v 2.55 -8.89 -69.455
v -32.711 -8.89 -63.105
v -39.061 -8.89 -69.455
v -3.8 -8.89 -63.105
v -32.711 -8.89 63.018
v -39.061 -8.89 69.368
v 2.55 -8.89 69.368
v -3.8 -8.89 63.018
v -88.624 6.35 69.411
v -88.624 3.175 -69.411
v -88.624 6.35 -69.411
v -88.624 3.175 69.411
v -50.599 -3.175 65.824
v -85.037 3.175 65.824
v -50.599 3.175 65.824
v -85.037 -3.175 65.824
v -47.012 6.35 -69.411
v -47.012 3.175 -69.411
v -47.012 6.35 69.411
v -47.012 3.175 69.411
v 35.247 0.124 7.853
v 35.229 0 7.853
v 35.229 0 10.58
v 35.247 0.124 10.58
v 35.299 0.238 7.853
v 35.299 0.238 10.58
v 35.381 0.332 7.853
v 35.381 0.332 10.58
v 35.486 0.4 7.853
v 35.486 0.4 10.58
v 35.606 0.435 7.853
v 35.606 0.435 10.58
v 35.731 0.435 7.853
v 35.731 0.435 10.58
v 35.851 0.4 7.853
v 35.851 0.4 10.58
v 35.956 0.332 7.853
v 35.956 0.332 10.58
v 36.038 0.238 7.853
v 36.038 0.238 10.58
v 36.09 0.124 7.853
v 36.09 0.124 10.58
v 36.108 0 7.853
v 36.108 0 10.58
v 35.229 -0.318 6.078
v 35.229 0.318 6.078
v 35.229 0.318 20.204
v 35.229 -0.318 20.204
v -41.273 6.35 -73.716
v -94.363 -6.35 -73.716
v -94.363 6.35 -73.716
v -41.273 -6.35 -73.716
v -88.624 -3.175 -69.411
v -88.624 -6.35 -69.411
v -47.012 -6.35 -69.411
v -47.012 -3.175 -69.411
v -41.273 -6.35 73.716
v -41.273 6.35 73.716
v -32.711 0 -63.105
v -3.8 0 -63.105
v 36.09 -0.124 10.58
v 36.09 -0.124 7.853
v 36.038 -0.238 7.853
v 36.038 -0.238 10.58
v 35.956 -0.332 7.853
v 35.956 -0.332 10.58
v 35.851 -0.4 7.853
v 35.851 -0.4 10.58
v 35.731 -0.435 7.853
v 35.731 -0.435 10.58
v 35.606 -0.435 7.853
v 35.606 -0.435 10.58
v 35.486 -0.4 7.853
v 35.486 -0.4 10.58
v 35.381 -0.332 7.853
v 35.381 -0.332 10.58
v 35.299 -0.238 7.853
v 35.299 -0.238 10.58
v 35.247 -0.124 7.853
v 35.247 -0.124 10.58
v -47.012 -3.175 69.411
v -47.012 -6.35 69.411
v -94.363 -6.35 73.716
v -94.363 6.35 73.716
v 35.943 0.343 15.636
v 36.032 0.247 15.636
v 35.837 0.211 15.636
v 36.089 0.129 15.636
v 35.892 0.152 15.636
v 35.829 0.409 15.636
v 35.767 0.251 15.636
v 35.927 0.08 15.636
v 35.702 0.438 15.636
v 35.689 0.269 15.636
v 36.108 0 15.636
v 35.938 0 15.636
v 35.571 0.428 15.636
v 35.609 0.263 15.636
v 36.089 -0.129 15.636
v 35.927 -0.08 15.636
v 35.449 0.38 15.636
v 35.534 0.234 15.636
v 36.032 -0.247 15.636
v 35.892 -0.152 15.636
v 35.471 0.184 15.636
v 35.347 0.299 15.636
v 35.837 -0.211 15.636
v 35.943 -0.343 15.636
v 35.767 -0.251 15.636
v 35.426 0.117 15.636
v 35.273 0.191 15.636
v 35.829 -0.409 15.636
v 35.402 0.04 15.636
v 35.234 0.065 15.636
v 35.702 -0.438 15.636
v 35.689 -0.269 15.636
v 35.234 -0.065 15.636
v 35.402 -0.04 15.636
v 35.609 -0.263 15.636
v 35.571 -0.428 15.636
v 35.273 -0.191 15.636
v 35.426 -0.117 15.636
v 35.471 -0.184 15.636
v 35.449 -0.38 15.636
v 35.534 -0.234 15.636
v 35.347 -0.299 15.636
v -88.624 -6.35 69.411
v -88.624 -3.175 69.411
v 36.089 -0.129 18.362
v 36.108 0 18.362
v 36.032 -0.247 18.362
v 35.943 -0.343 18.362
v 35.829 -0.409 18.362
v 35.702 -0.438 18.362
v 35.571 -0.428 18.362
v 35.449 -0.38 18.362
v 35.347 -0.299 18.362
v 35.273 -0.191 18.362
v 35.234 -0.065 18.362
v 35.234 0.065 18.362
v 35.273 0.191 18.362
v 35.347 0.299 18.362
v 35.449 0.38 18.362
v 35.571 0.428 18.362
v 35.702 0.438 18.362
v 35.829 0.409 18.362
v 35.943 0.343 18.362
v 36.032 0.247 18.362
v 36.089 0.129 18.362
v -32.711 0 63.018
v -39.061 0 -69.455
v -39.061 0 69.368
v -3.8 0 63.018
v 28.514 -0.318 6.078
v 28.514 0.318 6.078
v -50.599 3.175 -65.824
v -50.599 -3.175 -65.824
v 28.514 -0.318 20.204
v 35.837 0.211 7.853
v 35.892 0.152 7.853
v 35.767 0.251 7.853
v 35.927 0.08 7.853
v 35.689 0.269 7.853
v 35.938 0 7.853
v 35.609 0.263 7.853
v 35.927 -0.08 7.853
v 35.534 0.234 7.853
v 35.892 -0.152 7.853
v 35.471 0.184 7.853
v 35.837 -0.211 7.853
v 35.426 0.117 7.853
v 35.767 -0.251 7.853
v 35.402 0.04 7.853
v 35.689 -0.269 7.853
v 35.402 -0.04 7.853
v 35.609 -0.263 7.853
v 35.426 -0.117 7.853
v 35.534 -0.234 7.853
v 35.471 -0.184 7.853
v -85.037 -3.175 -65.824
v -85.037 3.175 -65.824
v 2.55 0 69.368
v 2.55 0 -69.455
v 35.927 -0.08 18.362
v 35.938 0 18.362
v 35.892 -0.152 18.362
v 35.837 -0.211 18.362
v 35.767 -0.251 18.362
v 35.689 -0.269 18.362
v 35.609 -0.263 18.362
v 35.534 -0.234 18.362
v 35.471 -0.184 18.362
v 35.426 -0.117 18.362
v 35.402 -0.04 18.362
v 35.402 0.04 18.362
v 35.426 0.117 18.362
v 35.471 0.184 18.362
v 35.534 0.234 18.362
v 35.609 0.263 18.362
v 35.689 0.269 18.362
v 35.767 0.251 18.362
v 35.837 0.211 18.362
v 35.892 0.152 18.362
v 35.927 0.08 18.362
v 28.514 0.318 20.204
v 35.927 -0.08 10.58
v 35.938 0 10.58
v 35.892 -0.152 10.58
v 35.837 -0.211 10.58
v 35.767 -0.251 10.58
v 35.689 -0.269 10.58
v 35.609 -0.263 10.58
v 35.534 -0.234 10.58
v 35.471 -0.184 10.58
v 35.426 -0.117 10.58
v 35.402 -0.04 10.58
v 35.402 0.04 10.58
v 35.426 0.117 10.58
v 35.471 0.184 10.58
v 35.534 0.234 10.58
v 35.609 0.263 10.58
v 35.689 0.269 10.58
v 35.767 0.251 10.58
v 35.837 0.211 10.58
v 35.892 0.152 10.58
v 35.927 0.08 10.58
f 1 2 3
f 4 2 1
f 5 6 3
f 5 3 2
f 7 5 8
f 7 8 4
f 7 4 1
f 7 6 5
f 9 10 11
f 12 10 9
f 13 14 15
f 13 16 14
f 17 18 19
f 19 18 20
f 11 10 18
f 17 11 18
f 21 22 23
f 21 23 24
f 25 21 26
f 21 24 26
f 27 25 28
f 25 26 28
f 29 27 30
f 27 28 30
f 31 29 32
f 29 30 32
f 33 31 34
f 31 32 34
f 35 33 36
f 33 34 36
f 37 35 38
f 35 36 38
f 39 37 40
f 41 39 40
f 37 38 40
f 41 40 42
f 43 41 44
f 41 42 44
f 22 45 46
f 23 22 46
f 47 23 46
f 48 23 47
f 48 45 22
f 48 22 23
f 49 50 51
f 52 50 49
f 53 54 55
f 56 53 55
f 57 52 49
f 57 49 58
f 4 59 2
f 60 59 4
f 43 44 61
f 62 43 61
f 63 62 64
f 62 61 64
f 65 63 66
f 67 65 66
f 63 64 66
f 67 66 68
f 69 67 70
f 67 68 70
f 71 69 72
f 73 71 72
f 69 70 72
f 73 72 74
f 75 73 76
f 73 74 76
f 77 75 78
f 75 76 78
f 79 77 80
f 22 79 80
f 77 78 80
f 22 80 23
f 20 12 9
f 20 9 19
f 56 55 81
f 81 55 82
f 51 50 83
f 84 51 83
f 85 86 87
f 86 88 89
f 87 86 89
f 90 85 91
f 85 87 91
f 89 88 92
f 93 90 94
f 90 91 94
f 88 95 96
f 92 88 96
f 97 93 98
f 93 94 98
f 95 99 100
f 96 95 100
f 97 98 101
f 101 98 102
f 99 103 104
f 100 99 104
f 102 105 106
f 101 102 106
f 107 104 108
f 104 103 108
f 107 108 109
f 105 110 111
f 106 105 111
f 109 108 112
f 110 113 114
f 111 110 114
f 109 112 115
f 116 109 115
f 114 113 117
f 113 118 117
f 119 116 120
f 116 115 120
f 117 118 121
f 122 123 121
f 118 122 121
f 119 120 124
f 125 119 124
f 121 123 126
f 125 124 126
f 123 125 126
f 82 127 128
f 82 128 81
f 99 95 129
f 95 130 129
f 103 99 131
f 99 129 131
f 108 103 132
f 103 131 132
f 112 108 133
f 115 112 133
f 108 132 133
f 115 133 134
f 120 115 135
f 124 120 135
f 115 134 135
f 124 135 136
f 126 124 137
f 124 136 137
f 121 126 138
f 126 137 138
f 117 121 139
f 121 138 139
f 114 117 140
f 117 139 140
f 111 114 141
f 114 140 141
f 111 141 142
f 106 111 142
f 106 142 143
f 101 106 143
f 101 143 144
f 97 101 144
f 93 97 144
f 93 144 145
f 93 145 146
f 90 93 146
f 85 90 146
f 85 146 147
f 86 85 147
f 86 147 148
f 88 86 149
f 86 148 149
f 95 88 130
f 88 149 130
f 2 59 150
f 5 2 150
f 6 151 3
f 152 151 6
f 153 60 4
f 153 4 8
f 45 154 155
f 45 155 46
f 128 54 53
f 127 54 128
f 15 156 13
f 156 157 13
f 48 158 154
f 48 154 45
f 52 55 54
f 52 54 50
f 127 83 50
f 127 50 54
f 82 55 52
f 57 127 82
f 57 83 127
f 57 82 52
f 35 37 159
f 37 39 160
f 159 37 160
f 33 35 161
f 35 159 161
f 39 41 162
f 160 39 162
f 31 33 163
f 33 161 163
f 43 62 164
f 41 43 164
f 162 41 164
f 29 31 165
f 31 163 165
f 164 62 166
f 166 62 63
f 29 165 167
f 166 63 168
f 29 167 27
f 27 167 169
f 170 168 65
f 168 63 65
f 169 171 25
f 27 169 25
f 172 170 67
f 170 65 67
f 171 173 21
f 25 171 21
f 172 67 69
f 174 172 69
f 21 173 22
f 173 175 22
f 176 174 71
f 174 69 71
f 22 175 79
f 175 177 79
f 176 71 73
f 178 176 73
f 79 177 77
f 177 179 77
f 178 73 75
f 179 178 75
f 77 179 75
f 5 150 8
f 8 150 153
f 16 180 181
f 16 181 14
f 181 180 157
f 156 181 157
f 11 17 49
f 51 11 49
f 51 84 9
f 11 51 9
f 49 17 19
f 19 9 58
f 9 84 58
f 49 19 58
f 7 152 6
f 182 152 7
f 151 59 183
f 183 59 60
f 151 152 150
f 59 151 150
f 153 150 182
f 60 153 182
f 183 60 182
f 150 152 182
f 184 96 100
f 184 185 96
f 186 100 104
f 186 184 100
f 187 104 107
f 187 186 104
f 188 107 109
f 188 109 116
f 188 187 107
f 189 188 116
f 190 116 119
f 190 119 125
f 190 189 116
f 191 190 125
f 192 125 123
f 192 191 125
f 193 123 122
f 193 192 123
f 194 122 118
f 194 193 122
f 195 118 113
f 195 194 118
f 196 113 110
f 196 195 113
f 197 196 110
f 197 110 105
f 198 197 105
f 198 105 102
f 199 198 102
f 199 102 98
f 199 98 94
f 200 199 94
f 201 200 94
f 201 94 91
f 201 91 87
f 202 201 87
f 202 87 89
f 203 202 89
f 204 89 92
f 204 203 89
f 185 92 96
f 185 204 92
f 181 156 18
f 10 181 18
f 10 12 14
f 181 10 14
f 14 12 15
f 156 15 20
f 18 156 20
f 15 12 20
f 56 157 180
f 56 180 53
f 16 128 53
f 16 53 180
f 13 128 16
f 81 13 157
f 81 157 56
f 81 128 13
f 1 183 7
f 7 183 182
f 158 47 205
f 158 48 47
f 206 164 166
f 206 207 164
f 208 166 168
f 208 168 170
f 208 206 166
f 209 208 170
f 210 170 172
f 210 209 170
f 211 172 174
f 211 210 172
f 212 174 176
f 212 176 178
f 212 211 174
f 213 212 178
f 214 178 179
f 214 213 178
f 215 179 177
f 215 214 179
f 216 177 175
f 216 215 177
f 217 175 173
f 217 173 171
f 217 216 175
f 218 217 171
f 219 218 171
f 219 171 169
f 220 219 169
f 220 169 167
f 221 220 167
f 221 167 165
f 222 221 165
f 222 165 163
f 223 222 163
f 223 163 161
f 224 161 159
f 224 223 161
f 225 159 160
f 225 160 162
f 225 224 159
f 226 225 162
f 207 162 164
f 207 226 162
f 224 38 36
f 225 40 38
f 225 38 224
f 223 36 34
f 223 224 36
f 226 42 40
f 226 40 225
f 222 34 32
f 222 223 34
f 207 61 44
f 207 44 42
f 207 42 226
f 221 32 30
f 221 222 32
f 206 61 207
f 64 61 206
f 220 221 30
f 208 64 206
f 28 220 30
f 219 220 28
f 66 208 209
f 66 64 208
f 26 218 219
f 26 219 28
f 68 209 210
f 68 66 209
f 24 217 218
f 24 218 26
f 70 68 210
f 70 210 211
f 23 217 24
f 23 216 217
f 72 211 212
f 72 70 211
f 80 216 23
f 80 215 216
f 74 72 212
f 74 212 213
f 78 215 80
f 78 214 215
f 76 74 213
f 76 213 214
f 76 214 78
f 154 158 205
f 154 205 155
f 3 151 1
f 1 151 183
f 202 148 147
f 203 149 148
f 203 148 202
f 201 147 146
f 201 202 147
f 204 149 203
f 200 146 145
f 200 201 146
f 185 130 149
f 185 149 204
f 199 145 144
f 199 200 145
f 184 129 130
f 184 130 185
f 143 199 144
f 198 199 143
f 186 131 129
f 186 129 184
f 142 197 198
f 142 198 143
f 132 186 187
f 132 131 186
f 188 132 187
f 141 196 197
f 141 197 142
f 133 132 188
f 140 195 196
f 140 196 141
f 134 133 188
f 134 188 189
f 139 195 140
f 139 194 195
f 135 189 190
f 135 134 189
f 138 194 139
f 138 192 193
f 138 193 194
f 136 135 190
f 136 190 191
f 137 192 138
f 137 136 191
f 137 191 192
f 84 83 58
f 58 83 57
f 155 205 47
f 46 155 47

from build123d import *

# Parameters (mm, degrees)
F0_W     = 41.6117869318
F0_H     = 138.8227045536
F0_W_2   = 34.4373397529
F0_H_2   = 131.6482573748
F1_DEPTH = 3.175
F0_W_3   = 53.0909001827
F0_H_3   = 147.4320292473
F2_DEPTH = 6.35
F3_W     = 41.6117869318
F3_H     = 138.8227045536
F3_W_2   = 28.9117869318
F3_H_2   = 126.1227045536
F4_DEPTH = 8.89
F5_W     = 0.1695360988
F5_H     = 2.7262568474
F7_DEPTH = 0.3175


# Not quite as in the source:
# - a feature names something its author has since deleted; it is built from what else it names


with BuildPart() as f1:
    # F0 (on Front) → F1 (new body, symmetric)
    with BuildSketch(Plane.XZ):
        with Locations((-67.8180083632, 0)):
            Rectangle(F0_W, F0_H)
        with Locations((-67.8180083632, 0)):
            Rectangle(F0_W_2, F0_H_2, mode=Mode.SUBTRACT)
    extrude(amount=F1_DEPTH, both=True)

    # F0 (on Front) → F2 (join, symmetric)
    with BuildSketch(Plane.XZ):
        with Locations((-67.8180083632, 0)):
            Rectangle(F0_W_3, F0_H_3)
        with Locations((-67.8180083632, 0)):
            Rectangle(F0_W, F0_H, mode=Mode.SUBTRACT)
    extrude(amount=F2_DEPTH, both=True)


with BuildPart() as f4:
    # F3 (on Front) → F4 (new body)
    with BuildSketch(Plane.XZ):
        with Locations((-18.2555075735, -0.0431761146)):
            Rectangle(F3_W, F3_H)
        with Locations((-18.2555075735, -0.0431761146)):
            Rectangle(F3_W_2, F3_H_2, mode=Mode.SUBTRACT)
    extrude(amount=F4_DEPTH)


with BuildPart() as f6:
    # F5 (on Front) → F6 (revolve)
    with BuildSketch(Plane.XZ):
        with Locations((36.0232619569, 16.9993210584)):
            Rectangle(F5_W, F5_H)
    revolve(axis=Axis((35.6687009335, 0, 16.9993210584), (0, 0, -1)))


with BuildPart() as f7:
    # F5 (on Front) → F7 (new body, symmetric)
    with BuildSketch(Plane.XZ):
        Polygon((35.2293718606, 20.2041938901), (28.5136234015, 20.2041938901), (28.5136234015, 6.0779694468), (35.2293718606, 6.0779694468), (35.2293718606, 7.853361778), (35.2293718606, 10.5796186253), (35.2293718606, 15.6361926347), (35.2293718606, 18.3624494821), align=None)
    extrude(amount=F7_DEPTH, both=True)

    # F5 (on Front) → F8 (revolve)
    with BuildSketch(Plane.XZ):
        with Locations((36.0232619569, 9.2164902017)):
            Rectangle(F5_W, F5_H)
    revolve(axis=Axis((35.6687009335, 0, 9.2164902017), (0, 0, -1)))


solid = Compound([f1.part, f4.part, f6.part, f7.part])
